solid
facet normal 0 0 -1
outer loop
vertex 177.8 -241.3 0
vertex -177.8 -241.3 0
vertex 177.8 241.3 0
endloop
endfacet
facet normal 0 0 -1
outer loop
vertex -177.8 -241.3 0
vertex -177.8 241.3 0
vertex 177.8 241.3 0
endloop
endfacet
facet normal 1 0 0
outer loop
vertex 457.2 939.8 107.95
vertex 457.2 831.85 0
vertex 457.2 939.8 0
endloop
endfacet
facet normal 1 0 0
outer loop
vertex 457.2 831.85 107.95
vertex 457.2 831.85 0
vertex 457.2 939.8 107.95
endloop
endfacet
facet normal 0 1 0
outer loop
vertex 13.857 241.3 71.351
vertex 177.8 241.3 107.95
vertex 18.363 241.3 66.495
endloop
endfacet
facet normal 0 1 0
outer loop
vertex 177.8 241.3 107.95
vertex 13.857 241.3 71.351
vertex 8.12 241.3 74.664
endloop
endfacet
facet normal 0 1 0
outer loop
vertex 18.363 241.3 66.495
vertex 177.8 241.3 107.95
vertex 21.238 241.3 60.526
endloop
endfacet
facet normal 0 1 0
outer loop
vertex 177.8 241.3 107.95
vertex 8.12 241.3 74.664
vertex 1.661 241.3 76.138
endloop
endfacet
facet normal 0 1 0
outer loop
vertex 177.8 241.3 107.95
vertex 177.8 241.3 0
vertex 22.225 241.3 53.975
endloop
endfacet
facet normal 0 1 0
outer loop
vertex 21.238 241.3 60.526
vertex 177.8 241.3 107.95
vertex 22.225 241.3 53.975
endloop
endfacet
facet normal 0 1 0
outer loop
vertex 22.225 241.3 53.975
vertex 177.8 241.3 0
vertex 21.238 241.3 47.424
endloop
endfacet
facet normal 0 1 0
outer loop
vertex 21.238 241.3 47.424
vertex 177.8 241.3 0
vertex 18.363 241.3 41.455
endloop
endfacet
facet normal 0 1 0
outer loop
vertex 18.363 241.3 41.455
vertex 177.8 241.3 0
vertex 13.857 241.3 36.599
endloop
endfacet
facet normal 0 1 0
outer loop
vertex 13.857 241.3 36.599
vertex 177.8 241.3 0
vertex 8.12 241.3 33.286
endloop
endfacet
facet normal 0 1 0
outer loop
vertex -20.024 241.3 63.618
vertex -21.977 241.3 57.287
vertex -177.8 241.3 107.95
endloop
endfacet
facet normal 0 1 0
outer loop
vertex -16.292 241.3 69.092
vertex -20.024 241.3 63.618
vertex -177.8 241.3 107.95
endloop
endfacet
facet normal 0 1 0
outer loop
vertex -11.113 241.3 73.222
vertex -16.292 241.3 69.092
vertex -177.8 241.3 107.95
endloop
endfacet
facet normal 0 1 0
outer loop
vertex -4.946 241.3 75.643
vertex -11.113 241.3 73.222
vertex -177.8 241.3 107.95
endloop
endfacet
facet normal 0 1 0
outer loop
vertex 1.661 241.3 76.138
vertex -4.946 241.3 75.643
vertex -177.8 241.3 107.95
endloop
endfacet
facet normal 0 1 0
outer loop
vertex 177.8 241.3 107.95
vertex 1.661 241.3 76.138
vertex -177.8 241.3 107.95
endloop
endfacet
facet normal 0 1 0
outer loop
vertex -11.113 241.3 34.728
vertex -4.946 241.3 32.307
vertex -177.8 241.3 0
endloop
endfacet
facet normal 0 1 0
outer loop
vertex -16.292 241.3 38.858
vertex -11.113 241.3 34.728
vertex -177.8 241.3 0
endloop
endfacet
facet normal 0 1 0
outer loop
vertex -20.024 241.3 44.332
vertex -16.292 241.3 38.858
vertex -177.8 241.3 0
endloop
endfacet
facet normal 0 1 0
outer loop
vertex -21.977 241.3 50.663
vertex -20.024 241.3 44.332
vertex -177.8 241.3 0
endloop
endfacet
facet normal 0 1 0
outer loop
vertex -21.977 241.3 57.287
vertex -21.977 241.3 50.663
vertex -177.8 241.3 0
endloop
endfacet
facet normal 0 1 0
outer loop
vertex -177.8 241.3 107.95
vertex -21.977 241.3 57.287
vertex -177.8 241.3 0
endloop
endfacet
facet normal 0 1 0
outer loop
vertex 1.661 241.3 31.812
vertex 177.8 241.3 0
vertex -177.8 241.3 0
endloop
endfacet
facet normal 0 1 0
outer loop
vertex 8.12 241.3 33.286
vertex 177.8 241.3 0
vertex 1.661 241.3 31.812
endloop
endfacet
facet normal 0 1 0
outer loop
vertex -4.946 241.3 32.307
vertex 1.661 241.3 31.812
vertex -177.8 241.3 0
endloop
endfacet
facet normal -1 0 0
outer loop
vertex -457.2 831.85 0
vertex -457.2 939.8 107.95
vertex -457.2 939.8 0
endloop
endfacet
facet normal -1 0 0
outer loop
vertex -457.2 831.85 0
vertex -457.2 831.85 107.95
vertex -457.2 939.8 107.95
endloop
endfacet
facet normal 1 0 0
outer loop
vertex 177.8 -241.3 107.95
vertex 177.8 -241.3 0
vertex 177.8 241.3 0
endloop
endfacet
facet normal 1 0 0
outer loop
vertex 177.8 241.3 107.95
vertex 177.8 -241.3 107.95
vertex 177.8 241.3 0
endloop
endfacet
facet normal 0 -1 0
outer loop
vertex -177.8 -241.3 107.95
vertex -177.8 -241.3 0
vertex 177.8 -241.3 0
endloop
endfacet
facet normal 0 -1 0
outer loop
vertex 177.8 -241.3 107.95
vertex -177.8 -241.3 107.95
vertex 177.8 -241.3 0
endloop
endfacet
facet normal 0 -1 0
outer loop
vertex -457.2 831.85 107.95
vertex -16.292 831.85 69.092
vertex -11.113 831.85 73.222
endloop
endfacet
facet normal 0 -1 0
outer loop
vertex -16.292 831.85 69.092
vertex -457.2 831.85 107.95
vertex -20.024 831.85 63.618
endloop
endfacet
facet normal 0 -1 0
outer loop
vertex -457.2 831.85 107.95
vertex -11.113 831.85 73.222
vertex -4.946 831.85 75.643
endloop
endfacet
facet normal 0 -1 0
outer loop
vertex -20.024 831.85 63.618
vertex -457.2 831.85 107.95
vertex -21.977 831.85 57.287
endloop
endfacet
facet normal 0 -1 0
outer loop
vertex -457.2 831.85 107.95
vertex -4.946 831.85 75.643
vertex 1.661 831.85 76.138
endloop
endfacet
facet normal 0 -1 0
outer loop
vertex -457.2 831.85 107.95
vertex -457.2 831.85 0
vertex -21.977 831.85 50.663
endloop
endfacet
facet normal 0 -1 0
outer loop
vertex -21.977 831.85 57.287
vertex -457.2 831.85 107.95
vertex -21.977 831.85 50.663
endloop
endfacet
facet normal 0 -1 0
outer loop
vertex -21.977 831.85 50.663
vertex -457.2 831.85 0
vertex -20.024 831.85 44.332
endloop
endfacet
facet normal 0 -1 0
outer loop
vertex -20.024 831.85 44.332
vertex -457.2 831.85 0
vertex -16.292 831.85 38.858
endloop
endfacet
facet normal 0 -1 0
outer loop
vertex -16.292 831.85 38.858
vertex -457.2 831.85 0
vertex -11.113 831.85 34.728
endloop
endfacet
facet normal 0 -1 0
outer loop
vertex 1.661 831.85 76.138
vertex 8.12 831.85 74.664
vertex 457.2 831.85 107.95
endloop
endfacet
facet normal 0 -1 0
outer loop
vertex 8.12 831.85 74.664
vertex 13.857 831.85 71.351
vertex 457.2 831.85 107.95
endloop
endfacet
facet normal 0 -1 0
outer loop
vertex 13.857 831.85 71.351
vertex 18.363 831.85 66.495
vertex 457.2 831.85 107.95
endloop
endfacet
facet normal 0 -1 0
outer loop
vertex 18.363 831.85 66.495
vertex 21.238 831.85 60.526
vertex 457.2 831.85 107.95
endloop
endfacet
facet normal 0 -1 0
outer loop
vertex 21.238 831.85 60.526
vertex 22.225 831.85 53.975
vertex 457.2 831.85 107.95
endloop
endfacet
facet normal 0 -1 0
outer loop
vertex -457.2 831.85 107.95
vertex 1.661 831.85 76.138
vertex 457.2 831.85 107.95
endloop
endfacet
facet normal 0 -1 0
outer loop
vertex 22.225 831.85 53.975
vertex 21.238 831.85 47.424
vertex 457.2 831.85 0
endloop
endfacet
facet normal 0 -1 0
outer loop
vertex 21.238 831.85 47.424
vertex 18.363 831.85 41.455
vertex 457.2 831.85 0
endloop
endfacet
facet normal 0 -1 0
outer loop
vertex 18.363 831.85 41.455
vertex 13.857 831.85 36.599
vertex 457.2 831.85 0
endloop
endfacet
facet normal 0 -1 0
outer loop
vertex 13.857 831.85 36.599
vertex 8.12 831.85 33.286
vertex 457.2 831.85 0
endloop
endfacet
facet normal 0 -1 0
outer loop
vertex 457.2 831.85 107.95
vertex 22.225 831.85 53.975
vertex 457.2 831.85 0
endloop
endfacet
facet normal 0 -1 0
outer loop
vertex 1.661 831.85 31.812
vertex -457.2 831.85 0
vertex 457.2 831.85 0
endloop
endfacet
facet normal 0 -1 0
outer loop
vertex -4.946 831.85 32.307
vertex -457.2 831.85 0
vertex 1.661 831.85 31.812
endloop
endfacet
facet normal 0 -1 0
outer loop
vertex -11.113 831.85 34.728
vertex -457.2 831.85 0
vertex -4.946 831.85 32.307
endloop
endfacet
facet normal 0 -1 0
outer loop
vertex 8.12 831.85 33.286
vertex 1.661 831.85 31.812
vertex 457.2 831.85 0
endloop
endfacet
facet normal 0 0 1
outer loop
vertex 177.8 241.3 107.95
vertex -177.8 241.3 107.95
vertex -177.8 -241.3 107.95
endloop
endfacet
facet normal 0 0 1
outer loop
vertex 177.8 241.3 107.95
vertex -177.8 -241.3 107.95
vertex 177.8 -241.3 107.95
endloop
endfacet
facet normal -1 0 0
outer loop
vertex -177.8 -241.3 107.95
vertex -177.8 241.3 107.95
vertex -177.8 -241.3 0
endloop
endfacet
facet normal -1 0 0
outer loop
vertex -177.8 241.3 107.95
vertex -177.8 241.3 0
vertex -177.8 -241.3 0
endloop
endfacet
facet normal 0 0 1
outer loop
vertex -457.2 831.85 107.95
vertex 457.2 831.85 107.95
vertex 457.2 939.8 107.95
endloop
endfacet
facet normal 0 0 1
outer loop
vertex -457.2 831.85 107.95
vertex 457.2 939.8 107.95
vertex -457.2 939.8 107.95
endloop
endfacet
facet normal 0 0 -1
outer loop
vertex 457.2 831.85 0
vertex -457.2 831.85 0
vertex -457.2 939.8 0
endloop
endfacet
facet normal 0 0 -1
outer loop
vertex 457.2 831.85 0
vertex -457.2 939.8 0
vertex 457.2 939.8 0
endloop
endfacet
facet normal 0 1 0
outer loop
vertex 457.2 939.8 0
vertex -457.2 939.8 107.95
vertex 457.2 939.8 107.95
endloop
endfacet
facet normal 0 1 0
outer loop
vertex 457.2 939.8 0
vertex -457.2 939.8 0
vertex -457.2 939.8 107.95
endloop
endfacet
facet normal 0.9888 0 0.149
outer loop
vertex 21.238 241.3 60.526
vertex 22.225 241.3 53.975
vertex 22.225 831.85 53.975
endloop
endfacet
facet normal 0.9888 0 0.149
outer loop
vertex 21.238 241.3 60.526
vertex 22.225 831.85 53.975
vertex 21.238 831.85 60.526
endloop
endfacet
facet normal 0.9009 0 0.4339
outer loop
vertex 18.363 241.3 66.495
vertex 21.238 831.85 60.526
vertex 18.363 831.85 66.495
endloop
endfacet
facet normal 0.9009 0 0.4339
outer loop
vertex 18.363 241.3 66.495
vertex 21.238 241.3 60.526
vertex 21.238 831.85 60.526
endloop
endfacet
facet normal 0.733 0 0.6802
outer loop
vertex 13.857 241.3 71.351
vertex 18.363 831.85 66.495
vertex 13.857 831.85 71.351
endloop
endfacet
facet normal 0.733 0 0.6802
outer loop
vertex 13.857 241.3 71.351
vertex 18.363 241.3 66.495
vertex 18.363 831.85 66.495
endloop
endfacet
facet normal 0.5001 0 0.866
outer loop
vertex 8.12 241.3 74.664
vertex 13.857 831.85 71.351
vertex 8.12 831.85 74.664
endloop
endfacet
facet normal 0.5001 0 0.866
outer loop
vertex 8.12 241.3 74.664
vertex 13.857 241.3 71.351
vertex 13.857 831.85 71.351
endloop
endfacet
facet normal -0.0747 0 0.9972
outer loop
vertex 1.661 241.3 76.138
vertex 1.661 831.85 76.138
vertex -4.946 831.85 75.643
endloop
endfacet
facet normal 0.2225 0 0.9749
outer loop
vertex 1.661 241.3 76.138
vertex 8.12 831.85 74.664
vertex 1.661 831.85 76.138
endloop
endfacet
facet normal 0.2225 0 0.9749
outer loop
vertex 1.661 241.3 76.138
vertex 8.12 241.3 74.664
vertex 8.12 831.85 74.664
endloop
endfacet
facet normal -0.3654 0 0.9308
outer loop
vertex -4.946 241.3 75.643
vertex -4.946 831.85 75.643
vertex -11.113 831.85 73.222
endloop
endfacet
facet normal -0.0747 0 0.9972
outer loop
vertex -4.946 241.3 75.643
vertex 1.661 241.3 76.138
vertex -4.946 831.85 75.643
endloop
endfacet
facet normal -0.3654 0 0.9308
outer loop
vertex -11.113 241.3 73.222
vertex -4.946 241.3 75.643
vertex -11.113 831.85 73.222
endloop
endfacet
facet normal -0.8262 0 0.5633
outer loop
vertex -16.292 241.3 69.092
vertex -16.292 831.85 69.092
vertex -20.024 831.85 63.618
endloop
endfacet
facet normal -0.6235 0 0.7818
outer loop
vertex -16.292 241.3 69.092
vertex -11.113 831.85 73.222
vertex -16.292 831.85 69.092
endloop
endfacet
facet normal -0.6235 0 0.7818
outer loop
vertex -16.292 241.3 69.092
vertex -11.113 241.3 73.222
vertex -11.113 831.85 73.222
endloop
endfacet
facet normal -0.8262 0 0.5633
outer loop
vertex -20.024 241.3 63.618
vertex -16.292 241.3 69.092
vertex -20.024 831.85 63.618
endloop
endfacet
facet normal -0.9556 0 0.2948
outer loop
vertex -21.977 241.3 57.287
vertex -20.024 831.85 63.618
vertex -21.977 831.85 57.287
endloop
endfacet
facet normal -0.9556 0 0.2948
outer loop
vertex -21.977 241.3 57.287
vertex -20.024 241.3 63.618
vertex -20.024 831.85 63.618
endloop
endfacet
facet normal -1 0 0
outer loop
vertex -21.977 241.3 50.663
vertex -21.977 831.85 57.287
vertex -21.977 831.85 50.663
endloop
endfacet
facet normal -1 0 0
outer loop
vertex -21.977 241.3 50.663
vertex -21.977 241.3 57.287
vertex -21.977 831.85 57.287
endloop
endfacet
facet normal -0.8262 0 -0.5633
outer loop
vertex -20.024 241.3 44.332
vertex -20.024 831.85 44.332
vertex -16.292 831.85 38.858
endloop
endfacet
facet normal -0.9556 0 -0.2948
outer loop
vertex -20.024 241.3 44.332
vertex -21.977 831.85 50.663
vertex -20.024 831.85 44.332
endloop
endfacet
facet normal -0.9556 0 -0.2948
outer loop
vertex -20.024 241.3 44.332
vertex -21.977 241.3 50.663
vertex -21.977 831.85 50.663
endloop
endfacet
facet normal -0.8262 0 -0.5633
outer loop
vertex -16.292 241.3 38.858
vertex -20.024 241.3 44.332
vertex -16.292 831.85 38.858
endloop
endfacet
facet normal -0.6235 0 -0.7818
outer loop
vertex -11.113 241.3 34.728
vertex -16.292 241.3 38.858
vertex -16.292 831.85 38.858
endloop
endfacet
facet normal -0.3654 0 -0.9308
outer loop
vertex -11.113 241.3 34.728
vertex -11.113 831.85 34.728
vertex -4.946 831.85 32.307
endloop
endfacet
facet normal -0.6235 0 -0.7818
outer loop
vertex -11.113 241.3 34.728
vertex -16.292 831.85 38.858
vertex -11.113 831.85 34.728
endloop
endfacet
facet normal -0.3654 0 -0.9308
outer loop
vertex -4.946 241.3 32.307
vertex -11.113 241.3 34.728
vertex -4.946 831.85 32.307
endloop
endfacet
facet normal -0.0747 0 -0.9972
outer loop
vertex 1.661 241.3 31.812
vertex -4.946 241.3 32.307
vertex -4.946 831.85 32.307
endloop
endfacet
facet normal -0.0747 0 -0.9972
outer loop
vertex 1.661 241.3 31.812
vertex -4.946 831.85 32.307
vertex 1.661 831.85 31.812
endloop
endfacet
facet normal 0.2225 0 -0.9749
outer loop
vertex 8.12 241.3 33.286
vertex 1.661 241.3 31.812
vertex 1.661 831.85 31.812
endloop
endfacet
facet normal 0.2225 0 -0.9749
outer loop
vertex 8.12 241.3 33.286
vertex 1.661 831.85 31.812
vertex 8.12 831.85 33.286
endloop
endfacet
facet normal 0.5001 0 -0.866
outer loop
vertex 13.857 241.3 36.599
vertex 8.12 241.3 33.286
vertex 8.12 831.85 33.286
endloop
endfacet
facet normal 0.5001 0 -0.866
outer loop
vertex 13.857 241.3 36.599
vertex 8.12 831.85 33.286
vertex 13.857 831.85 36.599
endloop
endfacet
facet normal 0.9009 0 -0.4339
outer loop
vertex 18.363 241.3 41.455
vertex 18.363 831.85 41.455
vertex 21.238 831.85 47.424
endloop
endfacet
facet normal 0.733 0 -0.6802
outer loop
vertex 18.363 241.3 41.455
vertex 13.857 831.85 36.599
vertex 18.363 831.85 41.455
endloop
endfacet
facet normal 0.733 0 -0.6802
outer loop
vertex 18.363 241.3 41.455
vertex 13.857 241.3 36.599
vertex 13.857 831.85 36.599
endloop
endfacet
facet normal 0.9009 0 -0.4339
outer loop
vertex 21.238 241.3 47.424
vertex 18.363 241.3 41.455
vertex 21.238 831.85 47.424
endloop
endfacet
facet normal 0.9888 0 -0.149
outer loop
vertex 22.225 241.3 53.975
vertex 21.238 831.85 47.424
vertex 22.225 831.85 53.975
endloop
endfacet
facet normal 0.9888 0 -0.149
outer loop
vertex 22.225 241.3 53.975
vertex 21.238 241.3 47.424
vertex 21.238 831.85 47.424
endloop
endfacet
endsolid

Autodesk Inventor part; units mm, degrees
ref_plane "YZ Plane" through (0, 0, 0) normal (1, 0, 0) x (0, 1, 0)
ref_plane "XZ Plane" through (0, 0, 0) normal (0, 1, 0) x (-1, 0, 0)
ref_plane "XY Plane" through (0, 0, 0) normal (0, 0, 1) x (1, 0, 0)
sketch "Sketch1" plane through (0, 0, 0) normal (0, 0, 1) x (1, 0, 0)
  line L0 (-177.8, -241.3) -> (177.8, -241.3)
  line L1 (177.8, -241.3) -> (177.8, 241.3)
  line L2 (177.8, 241.3) -> (-177.8, 241.3)
  line L3 (-177.8, 241.3) -> (-177.8, -241.3)
  line L4 (-177.8, -241.3) -> (177.8, 241.3) construction
  line L5 (177.8, -241.3) -> (-177.8, 241.3) construction
  point P0 (0, 0)
  dimension "d0" = 355.6
  dimension "d1" = 482.6
extrude "Extrusion1" add sketch "Sketch1" along normal blind 107.95
sketch "Sketch2" plane through (-177.8, 241.3, 0) normal (0, 1, 0) x (1, 0, 0)
  line L0 (355.6, 0) -> (0, 0) projected
  line L1 (0, 0) -> (0, -107.95) projected
  line L2 (355.6, -107.95) -> (0, -107.95) projected
  line L3 (355.6, 0) -> (355.6, -107.95) projected
  circle A0 centre (177.8, -53.975) radius 22.225
  line L4 (177.8, -53.975) -> (177.8, -107.95) construction
  line L5 (0, -107.95) -> (355.6, -107.95) projected
  line L6 (177.8, -53.975) -> (355.6, -53.975) construction
  point P0 (177.8, 0)
  dimension "d4" = 44.45
extrude "Extrusion2" add sketch "Sketch2" along normal blind 590.55 contours A0
sketch "Sketch3" plane through (0, 831.85, 53.975) normal (0, 1, 0) x (1, 0, 0)
  circle A0 centre (0, 0) radius 22.225 projected
  line L0 (-457.2, 53.975) -> (457.2, 53.975)
  line L1 (457.2, 53.975) -> (457.2, -53.975)
  line L2 (457.2, -53.975) -> (-457.2, -53.975)
  line L3 (-457.2, -53.975) -> (-457.2, 53.975)
  circle A1 centre (0, 0) radius 22.225 projected
  line L4 (177.8, 53.975) -> (-177.8, 53.975) projected
  line L5 (-177.8, 53.975) -> (-177.8, -53.975) projected
  line L6 (177.8, -53.975) -> (-177.8, -53.975) projected
  line L7 (177.8, 53.975) -> (177.8, -53.975) projected
  line L8 (0, 0) -> (0, 53.975) construction
  point P0 (0, 53.975)
  dimension "d7" = 914.4
  dimension "d10" = 107.95
extrude "Extrusion3" add sketch "Sketch3" along normal blind 107.95 contours A0 | L0 L5 L2 L3 | L0 L7 L2 L5 | L0 L1 L2 L7
properties part number "switchbox"
